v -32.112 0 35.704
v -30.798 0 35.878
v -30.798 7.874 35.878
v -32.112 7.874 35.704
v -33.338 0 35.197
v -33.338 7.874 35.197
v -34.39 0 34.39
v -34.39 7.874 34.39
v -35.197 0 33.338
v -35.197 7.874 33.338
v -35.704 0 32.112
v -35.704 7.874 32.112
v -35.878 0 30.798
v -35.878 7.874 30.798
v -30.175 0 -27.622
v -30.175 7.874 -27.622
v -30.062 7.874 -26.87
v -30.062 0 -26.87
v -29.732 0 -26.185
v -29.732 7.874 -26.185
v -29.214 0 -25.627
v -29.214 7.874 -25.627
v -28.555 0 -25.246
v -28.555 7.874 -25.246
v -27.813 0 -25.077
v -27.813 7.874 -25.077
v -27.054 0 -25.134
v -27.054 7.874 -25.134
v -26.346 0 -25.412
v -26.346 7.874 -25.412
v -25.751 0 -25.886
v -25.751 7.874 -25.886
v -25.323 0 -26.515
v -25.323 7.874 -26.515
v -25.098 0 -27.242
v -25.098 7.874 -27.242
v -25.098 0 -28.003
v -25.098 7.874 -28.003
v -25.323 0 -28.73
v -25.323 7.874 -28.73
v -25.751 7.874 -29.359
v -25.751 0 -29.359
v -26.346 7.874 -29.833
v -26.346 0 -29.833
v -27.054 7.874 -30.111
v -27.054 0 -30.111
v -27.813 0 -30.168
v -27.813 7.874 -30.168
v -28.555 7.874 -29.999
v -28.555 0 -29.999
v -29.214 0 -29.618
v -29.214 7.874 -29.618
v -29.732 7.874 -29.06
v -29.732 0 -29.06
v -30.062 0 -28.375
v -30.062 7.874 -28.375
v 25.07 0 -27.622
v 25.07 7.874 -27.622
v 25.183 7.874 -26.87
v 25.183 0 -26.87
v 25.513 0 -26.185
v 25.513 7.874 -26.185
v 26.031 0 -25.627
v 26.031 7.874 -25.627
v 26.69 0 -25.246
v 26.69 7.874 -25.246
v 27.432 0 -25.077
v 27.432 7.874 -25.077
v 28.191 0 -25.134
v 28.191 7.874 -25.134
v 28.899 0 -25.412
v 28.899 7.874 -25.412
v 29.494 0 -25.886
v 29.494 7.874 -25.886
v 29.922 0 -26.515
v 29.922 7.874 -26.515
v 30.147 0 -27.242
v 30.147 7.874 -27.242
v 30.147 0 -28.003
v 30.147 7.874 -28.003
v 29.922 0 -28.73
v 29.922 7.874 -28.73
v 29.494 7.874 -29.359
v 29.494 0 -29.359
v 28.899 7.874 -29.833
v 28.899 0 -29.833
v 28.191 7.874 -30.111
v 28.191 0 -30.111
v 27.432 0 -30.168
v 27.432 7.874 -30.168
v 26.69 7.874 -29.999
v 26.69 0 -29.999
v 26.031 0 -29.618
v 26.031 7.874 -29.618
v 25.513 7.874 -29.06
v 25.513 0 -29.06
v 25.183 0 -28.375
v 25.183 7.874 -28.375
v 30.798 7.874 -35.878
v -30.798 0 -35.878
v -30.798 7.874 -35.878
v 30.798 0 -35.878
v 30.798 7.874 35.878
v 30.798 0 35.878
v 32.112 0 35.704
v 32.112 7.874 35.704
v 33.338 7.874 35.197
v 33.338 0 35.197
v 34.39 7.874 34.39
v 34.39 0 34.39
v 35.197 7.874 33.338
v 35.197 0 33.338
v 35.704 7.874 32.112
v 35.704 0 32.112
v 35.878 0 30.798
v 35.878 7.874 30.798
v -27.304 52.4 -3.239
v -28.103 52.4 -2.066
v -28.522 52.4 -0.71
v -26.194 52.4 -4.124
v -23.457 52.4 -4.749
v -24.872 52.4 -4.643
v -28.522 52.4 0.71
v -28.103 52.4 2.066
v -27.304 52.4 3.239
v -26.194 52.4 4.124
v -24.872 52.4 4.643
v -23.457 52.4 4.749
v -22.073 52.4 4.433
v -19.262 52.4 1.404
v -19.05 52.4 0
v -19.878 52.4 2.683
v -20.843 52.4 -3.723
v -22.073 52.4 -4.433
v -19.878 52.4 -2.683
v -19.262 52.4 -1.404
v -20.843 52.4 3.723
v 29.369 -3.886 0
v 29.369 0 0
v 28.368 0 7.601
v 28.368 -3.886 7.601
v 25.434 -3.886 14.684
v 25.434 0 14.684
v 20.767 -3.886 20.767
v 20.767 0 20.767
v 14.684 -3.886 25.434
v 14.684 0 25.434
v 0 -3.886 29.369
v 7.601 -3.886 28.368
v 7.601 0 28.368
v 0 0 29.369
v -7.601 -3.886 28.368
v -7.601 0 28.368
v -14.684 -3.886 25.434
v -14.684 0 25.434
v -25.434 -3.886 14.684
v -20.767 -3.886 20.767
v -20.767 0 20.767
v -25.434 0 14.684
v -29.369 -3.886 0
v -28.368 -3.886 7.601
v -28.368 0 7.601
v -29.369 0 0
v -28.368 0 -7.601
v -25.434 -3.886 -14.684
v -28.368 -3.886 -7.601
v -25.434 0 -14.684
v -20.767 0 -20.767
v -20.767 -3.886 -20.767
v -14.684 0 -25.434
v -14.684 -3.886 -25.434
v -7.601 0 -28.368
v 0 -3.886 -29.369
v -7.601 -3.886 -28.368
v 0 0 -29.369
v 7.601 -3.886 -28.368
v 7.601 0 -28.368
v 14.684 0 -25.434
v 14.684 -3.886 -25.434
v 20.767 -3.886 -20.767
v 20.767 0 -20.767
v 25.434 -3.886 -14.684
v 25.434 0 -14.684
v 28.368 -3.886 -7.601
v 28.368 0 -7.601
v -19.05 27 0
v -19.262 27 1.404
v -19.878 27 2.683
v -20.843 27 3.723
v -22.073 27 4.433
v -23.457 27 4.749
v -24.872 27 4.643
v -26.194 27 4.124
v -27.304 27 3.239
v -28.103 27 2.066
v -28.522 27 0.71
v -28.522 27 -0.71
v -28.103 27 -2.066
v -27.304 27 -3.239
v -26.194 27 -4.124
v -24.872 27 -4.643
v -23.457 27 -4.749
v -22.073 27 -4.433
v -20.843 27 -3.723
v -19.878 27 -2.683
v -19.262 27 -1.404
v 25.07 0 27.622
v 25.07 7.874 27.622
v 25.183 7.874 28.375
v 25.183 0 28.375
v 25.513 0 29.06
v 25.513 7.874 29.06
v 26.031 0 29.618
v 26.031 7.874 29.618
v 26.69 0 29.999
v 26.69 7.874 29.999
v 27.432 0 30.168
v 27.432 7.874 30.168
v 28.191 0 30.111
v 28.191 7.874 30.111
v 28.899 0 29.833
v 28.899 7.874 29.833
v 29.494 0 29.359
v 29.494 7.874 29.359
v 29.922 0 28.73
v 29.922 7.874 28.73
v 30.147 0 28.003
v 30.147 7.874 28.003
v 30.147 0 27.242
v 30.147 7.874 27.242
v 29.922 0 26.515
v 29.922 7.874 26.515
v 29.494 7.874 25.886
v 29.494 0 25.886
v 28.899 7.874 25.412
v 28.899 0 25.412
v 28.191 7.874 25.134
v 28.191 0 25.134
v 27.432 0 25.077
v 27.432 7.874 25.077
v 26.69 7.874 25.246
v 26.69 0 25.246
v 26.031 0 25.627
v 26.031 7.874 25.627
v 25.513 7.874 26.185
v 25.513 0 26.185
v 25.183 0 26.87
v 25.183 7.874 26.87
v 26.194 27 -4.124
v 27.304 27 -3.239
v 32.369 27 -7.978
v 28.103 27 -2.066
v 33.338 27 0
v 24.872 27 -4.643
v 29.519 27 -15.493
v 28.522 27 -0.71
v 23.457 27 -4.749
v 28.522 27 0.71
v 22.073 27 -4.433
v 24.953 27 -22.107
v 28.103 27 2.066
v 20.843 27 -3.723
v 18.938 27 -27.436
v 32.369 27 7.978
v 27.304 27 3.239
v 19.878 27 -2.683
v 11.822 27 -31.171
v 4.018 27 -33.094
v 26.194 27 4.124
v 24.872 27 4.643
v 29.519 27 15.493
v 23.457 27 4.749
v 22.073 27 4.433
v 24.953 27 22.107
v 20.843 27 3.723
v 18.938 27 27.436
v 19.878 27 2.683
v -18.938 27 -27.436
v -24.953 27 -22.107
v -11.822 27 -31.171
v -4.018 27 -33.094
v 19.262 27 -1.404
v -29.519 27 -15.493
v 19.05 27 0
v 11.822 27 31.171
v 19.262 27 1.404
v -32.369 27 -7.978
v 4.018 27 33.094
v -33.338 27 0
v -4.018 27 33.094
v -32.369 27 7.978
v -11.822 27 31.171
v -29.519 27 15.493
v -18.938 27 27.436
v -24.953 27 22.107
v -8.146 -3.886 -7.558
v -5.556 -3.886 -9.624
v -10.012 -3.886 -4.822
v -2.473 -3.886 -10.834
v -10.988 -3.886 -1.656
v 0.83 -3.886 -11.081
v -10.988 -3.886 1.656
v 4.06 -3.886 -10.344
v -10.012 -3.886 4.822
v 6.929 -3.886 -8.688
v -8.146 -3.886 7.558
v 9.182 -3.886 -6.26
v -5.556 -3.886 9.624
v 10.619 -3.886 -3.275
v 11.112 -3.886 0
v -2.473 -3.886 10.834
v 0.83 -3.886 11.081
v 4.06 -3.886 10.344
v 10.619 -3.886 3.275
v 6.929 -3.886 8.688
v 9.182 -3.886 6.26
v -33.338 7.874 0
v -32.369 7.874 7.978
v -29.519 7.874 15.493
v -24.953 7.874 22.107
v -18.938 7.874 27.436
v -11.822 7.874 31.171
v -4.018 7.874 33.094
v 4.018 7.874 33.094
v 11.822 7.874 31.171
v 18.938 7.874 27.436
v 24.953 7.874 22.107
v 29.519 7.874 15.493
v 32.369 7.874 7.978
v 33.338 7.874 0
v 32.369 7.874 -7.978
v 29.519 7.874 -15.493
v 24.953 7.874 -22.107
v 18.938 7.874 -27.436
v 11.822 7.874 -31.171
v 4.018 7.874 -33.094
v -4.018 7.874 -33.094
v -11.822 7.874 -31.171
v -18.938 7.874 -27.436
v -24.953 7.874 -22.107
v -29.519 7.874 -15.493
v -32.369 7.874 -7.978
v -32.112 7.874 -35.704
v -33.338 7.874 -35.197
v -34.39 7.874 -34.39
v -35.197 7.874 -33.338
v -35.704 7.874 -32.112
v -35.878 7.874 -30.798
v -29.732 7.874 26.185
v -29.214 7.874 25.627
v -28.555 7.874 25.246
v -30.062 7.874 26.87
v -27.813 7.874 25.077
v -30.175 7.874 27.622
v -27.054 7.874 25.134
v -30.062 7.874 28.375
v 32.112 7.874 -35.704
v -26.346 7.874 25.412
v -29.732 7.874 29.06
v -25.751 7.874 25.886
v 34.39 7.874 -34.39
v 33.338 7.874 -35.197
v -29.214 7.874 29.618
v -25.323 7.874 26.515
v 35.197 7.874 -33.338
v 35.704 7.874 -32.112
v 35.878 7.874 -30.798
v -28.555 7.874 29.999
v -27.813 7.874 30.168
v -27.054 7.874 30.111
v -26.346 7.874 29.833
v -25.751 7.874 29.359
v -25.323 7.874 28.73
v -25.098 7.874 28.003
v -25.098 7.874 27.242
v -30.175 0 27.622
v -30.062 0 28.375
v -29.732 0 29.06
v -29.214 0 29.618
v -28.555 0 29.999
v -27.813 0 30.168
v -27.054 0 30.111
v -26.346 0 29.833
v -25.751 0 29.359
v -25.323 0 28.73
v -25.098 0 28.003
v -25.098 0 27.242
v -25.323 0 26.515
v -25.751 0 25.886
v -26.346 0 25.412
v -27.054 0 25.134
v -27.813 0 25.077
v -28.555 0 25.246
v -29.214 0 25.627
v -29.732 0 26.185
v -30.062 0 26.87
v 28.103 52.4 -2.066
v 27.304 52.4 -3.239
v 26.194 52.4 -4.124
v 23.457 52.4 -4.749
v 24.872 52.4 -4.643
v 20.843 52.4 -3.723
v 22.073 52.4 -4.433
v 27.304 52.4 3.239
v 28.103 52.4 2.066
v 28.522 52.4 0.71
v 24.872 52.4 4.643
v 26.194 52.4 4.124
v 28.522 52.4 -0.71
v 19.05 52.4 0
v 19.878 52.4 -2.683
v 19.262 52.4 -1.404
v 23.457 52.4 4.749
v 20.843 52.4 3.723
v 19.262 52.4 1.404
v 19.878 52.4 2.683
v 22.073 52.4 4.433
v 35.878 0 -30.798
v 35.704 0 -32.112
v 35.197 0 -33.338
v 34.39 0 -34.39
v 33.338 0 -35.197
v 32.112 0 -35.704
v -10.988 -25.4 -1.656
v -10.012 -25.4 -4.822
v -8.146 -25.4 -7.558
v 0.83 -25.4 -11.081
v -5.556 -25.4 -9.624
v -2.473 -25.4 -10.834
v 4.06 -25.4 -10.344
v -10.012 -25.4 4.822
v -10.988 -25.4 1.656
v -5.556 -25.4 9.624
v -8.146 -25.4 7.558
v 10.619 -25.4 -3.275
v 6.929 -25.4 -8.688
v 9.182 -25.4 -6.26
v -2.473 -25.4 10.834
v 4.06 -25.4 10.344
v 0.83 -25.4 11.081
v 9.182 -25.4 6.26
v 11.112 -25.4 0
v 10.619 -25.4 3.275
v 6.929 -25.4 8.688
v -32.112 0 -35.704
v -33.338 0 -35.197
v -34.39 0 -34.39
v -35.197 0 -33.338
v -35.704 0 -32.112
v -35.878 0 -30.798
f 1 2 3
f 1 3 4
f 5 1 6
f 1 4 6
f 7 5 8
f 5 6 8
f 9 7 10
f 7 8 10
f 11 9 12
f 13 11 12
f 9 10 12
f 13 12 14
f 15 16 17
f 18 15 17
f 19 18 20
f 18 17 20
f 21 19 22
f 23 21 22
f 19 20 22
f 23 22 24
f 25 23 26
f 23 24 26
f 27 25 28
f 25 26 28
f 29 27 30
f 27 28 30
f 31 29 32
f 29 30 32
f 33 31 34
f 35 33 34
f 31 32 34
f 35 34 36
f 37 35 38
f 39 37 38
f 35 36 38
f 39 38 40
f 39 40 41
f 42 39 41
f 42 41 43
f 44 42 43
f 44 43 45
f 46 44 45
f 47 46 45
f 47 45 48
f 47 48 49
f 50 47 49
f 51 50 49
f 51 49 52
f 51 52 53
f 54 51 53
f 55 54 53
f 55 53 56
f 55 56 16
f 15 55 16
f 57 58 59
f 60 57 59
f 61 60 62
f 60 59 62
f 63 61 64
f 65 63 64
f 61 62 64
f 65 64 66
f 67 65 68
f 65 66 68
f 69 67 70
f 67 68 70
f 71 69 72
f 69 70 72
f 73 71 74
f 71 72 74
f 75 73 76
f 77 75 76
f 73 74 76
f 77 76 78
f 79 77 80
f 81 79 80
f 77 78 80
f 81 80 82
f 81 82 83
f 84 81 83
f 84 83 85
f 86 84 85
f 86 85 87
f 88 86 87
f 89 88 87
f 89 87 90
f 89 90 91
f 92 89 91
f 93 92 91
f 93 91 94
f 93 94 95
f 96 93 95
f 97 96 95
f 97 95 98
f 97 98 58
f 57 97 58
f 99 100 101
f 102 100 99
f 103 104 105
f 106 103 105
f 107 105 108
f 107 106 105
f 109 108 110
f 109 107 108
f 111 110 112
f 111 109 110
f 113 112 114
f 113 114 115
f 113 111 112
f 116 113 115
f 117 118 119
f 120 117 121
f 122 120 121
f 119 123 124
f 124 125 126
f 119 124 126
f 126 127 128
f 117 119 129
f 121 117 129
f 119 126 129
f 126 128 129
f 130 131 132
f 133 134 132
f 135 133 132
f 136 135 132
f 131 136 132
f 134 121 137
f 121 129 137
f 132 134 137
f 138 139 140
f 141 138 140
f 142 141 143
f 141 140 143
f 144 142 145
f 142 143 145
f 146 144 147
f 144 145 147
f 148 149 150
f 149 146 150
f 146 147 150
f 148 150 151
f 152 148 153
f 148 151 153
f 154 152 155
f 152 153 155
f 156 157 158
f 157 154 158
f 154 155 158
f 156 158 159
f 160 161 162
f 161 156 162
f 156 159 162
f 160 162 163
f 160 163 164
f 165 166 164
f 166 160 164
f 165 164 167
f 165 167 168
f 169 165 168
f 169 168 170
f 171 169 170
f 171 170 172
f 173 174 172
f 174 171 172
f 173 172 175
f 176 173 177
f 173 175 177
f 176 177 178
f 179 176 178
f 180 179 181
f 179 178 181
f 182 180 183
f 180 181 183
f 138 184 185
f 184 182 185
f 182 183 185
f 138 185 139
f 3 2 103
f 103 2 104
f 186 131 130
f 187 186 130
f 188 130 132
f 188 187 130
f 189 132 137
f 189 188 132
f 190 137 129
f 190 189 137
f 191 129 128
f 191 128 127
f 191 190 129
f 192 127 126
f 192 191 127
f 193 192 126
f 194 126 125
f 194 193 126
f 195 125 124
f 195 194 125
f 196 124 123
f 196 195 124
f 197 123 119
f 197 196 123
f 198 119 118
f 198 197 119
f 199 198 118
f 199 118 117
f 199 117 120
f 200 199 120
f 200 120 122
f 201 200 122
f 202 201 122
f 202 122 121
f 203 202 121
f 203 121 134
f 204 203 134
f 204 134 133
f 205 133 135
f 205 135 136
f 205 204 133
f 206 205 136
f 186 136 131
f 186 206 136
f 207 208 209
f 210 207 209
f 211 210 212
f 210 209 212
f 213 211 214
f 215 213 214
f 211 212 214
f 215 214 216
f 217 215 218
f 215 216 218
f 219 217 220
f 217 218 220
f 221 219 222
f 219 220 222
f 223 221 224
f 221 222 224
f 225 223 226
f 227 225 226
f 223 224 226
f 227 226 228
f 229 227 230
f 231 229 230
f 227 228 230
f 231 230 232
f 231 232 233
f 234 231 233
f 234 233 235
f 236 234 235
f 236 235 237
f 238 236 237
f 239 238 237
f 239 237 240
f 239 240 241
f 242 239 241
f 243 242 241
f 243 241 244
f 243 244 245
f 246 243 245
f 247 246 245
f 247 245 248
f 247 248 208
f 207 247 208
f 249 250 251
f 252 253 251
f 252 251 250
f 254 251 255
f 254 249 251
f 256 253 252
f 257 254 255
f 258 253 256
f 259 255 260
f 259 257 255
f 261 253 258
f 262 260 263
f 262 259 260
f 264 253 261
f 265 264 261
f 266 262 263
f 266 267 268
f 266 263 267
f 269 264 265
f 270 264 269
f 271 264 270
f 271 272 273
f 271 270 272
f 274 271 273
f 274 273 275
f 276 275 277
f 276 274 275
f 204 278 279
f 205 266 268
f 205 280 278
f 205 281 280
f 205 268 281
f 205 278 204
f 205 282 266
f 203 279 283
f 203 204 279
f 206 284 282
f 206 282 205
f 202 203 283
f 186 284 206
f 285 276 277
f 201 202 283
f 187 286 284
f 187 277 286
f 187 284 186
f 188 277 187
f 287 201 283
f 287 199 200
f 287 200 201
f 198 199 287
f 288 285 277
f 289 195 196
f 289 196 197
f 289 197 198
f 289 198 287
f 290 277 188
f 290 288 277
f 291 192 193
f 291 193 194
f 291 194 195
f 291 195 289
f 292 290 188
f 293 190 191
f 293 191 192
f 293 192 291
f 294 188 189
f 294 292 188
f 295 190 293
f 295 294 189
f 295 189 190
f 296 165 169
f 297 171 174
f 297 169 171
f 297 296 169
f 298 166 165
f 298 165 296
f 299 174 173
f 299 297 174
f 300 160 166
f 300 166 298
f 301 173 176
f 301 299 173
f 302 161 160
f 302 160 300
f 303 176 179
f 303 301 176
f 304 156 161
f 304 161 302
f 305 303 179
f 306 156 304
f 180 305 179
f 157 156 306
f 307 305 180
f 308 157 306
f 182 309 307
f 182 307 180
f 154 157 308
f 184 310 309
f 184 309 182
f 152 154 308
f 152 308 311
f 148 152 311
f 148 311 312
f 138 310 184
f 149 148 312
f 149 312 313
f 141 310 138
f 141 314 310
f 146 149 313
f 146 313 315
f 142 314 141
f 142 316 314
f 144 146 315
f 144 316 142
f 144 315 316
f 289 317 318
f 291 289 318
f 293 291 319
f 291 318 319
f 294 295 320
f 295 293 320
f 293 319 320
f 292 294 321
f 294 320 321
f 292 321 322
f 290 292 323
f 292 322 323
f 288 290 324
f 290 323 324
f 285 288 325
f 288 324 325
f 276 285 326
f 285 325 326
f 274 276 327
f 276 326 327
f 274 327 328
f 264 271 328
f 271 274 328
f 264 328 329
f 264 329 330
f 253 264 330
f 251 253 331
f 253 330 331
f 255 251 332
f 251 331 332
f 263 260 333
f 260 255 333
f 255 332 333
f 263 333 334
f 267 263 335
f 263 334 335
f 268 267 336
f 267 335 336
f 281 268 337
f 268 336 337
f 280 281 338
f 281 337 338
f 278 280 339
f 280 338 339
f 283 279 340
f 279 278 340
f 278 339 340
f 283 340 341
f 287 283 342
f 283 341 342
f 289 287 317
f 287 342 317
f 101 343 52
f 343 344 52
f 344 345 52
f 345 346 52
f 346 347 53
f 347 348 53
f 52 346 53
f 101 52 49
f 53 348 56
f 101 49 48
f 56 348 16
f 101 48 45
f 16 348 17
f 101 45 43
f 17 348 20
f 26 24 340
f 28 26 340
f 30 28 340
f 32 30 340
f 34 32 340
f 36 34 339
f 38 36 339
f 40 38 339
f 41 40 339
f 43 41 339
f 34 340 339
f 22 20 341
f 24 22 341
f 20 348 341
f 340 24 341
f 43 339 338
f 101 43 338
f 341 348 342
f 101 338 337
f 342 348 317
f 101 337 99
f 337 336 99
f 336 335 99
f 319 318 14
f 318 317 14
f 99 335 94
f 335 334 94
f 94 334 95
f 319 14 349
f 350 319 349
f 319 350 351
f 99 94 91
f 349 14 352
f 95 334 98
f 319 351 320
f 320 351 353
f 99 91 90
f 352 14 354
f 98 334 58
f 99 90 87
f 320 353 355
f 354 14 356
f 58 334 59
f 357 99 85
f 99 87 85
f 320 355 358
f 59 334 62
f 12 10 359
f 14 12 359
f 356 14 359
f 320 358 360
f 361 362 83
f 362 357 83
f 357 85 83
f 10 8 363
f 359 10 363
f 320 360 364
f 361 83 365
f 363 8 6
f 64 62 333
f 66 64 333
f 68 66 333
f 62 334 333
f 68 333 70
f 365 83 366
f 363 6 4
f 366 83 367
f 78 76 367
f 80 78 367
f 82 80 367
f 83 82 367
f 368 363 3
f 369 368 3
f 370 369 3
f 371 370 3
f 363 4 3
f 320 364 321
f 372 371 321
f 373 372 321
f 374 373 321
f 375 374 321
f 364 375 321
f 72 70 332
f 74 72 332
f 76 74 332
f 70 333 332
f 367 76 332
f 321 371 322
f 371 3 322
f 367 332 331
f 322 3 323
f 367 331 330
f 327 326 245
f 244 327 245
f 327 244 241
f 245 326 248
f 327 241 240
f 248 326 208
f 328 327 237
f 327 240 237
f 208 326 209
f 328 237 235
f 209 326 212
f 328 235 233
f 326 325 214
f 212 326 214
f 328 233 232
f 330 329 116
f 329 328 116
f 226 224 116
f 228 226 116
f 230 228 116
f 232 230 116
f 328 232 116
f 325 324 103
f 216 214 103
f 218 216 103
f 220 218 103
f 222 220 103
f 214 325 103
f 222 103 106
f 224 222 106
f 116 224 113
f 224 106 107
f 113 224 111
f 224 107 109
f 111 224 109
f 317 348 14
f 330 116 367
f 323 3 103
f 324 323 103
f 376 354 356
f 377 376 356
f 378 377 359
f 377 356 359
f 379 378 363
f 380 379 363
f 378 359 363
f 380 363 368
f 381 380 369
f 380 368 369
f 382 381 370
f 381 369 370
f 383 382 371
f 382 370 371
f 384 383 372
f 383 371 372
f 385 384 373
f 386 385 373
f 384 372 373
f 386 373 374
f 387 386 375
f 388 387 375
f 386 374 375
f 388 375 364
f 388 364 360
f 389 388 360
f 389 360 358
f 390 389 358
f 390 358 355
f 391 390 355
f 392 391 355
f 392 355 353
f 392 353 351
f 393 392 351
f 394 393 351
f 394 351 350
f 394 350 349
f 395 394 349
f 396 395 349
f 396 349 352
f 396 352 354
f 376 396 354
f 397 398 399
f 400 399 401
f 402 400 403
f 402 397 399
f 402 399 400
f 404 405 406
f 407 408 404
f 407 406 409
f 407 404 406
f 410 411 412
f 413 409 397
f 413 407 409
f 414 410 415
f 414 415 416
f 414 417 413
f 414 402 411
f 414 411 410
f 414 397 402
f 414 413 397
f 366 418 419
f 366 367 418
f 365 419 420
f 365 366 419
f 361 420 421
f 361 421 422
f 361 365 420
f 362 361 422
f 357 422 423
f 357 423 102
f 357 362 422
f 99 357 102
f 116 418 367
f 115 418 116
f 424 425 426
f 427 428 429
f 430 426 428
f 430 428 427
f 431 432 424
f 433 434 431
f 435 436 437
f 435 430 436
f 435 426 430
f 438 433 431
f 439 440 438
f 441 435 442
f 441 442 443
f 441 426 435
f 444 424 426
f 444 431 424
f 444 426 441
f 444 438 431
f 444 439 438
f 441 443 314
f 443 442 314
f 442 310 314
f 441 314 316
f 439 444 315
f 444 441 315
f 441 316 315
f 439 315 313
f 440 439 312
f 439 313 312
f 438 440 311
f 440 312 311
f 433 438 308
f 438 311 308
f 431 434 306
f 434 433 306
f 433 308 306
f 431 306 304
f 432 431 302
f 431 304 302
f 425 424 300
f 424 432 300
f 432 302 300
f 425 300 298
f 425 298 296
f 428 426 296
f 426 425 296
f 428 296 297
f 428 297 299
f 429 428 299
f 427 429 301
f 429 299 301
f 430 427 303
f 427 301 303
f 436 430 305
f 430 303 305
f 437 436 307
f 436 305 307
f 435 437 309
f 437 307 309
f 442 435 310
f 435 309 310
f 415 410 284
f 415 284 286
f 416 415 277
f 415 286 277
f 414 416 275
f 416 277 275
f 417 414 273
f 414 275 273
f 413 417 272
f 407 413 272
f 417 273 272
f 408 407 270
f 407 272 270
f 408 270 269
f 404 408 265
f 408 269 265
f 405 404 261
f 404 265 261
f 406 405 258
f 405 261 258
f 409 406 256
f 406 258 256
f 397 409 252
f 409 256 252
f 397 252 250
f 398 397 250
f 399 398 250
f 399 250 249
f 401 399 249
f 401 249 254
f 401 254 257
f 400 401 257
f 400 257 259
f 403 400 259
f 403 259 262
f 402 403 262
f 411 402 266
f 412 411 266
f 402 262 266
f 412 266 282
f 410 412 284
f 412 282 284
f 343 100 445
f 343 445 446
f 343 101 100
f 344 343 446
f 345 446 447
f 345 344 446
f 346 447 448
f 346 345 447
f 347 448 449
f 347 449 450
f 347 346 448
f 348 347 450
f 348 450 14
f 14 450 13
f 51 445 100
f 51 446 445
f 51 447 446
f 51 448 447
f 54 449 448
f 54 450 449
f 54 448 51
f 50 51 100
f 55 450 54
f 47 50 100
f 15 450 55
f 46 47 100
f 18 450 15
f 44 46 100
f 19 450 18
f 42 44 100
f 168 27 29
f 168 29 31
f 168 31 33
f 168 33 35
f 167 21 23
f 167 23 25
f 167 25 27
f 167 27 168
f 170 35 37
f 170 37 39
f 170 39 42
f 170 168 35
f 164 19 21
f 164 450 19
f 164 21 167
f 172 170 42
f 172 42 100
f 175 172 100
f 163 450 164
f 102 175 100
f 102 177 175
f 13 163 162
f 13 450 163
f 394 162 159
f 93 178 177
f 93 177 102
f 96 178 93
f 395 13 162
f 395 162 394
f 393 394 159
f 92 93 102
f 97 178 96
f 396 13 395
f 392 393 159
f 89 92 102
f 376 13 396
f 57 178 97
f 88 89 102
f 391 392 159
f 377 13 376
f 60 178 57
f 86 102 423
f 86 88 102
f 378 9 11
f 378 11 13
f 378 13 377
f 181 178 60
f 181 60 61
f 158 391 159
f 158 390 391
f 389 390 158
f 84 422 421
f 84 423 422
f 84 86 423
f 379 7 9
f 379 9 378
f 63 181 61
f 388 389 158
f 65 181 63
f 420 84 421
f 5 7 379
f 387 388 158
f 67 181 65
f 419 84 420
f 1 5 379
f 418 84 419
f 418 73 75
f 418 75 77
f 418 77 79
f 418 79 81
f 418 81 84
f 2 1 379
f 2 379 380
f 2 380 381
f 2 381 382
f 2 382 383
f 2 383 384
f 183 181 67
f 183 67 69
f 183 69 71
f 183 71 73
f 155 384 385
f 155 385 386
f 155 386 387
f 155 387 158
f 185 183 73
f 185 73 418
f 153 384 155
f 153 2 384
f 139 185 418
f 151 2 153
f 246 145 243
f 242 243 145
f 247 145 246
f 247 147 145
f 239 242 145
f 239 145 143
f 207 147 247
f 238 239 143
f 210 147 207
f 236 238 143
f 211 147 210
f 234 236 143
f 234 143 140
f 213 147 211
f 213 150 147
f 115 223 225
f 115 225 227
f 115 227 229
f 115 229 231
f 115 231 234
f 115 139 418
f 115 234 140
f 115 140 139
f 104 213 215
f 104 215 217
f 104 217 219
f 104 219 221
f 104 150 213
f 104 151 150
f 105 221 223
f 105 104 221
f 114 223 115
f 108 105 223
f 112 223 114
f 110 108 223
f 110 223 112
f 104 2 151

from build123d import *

# Parameters (mm, degrees)
F0_W      = 71.755
F0_H      = 71.755
F1_DEPTH  = 7.874
F2_R      = 11.1125
F3_DEPTH  = 25.4
F5_D      = 5.1054
F7_R      = 33.3375
F8_DEPTH  = 19.1262
F9_R      = 4.7625
F10_DEPTH = 25.4
F6_R      = 29.36875
F11_DEPTH = 3.8862
F13_R     = 5.08


with BuildPart() as f1:
    # F0 (on Front) → F1 (new body)
    with BuildSketch(Plane.XZ):
        Rectangle(F0_W, F0_H)
    extrude(amount=-F1_DEPTH)

    # F2 (on face) → F3 (join)
    with BuildSketch(Plane.XZ):
        Circle(F2_R)
    extrude(amount=F3_DEPTH)

    # F5 (through all)
    with Locations(Plane.XZ):
        with Locations((27.6225, 27.6225), (27.6225, -27.6225), (-27.6225, -27.6225), (-27.6225, 27.6225)):
            Hole(F5_D / 2)

    # F7 (on face) → F8 (join)
    with BuildSketch(Plane(origin=(0, 7.874, 0), x_dir=(-1, 0, 0), z_dir=(0, 1, 0))):
        Circle(F7_R)
    extrude(amount=F8_DEPTH)

    # F9 (on face) → F10 (join)
    with BuildSketch(Plane(origin=(0, 27.0002, 0), x_dir=(-1, 0, 0), z_dir=(0, 1, 0))):
        with Locations((-23.8125, 0)):
            Circle(F9_R)
    extrude(amount=F10_DEPTH)

    # F6 (on face) → F11 (join)
    with BuildSketch(Plane.XZ):
        Circle(F6_R)
    extrude(amount=F11_DEPTH)

    # F12: F1 across plane


with BuildPart() as f1_1:
    add(f1.part)
    add(f1.part.mirror(Plane.YZ))

    # F13
    f13_edges = [f1_1.edges().sort_by_distance(p)[0] for p in [
        (35.8775, 3.937, 35.8775),
        (35.8775, 3.937, -35.8775),
        (-35.8775, 3.937, -35.8775),
        (-35.8775, 3.937, 35.8775),
    ]]
    fillet(f13_edges, radius=F13_R)


solid = f1_1.part
